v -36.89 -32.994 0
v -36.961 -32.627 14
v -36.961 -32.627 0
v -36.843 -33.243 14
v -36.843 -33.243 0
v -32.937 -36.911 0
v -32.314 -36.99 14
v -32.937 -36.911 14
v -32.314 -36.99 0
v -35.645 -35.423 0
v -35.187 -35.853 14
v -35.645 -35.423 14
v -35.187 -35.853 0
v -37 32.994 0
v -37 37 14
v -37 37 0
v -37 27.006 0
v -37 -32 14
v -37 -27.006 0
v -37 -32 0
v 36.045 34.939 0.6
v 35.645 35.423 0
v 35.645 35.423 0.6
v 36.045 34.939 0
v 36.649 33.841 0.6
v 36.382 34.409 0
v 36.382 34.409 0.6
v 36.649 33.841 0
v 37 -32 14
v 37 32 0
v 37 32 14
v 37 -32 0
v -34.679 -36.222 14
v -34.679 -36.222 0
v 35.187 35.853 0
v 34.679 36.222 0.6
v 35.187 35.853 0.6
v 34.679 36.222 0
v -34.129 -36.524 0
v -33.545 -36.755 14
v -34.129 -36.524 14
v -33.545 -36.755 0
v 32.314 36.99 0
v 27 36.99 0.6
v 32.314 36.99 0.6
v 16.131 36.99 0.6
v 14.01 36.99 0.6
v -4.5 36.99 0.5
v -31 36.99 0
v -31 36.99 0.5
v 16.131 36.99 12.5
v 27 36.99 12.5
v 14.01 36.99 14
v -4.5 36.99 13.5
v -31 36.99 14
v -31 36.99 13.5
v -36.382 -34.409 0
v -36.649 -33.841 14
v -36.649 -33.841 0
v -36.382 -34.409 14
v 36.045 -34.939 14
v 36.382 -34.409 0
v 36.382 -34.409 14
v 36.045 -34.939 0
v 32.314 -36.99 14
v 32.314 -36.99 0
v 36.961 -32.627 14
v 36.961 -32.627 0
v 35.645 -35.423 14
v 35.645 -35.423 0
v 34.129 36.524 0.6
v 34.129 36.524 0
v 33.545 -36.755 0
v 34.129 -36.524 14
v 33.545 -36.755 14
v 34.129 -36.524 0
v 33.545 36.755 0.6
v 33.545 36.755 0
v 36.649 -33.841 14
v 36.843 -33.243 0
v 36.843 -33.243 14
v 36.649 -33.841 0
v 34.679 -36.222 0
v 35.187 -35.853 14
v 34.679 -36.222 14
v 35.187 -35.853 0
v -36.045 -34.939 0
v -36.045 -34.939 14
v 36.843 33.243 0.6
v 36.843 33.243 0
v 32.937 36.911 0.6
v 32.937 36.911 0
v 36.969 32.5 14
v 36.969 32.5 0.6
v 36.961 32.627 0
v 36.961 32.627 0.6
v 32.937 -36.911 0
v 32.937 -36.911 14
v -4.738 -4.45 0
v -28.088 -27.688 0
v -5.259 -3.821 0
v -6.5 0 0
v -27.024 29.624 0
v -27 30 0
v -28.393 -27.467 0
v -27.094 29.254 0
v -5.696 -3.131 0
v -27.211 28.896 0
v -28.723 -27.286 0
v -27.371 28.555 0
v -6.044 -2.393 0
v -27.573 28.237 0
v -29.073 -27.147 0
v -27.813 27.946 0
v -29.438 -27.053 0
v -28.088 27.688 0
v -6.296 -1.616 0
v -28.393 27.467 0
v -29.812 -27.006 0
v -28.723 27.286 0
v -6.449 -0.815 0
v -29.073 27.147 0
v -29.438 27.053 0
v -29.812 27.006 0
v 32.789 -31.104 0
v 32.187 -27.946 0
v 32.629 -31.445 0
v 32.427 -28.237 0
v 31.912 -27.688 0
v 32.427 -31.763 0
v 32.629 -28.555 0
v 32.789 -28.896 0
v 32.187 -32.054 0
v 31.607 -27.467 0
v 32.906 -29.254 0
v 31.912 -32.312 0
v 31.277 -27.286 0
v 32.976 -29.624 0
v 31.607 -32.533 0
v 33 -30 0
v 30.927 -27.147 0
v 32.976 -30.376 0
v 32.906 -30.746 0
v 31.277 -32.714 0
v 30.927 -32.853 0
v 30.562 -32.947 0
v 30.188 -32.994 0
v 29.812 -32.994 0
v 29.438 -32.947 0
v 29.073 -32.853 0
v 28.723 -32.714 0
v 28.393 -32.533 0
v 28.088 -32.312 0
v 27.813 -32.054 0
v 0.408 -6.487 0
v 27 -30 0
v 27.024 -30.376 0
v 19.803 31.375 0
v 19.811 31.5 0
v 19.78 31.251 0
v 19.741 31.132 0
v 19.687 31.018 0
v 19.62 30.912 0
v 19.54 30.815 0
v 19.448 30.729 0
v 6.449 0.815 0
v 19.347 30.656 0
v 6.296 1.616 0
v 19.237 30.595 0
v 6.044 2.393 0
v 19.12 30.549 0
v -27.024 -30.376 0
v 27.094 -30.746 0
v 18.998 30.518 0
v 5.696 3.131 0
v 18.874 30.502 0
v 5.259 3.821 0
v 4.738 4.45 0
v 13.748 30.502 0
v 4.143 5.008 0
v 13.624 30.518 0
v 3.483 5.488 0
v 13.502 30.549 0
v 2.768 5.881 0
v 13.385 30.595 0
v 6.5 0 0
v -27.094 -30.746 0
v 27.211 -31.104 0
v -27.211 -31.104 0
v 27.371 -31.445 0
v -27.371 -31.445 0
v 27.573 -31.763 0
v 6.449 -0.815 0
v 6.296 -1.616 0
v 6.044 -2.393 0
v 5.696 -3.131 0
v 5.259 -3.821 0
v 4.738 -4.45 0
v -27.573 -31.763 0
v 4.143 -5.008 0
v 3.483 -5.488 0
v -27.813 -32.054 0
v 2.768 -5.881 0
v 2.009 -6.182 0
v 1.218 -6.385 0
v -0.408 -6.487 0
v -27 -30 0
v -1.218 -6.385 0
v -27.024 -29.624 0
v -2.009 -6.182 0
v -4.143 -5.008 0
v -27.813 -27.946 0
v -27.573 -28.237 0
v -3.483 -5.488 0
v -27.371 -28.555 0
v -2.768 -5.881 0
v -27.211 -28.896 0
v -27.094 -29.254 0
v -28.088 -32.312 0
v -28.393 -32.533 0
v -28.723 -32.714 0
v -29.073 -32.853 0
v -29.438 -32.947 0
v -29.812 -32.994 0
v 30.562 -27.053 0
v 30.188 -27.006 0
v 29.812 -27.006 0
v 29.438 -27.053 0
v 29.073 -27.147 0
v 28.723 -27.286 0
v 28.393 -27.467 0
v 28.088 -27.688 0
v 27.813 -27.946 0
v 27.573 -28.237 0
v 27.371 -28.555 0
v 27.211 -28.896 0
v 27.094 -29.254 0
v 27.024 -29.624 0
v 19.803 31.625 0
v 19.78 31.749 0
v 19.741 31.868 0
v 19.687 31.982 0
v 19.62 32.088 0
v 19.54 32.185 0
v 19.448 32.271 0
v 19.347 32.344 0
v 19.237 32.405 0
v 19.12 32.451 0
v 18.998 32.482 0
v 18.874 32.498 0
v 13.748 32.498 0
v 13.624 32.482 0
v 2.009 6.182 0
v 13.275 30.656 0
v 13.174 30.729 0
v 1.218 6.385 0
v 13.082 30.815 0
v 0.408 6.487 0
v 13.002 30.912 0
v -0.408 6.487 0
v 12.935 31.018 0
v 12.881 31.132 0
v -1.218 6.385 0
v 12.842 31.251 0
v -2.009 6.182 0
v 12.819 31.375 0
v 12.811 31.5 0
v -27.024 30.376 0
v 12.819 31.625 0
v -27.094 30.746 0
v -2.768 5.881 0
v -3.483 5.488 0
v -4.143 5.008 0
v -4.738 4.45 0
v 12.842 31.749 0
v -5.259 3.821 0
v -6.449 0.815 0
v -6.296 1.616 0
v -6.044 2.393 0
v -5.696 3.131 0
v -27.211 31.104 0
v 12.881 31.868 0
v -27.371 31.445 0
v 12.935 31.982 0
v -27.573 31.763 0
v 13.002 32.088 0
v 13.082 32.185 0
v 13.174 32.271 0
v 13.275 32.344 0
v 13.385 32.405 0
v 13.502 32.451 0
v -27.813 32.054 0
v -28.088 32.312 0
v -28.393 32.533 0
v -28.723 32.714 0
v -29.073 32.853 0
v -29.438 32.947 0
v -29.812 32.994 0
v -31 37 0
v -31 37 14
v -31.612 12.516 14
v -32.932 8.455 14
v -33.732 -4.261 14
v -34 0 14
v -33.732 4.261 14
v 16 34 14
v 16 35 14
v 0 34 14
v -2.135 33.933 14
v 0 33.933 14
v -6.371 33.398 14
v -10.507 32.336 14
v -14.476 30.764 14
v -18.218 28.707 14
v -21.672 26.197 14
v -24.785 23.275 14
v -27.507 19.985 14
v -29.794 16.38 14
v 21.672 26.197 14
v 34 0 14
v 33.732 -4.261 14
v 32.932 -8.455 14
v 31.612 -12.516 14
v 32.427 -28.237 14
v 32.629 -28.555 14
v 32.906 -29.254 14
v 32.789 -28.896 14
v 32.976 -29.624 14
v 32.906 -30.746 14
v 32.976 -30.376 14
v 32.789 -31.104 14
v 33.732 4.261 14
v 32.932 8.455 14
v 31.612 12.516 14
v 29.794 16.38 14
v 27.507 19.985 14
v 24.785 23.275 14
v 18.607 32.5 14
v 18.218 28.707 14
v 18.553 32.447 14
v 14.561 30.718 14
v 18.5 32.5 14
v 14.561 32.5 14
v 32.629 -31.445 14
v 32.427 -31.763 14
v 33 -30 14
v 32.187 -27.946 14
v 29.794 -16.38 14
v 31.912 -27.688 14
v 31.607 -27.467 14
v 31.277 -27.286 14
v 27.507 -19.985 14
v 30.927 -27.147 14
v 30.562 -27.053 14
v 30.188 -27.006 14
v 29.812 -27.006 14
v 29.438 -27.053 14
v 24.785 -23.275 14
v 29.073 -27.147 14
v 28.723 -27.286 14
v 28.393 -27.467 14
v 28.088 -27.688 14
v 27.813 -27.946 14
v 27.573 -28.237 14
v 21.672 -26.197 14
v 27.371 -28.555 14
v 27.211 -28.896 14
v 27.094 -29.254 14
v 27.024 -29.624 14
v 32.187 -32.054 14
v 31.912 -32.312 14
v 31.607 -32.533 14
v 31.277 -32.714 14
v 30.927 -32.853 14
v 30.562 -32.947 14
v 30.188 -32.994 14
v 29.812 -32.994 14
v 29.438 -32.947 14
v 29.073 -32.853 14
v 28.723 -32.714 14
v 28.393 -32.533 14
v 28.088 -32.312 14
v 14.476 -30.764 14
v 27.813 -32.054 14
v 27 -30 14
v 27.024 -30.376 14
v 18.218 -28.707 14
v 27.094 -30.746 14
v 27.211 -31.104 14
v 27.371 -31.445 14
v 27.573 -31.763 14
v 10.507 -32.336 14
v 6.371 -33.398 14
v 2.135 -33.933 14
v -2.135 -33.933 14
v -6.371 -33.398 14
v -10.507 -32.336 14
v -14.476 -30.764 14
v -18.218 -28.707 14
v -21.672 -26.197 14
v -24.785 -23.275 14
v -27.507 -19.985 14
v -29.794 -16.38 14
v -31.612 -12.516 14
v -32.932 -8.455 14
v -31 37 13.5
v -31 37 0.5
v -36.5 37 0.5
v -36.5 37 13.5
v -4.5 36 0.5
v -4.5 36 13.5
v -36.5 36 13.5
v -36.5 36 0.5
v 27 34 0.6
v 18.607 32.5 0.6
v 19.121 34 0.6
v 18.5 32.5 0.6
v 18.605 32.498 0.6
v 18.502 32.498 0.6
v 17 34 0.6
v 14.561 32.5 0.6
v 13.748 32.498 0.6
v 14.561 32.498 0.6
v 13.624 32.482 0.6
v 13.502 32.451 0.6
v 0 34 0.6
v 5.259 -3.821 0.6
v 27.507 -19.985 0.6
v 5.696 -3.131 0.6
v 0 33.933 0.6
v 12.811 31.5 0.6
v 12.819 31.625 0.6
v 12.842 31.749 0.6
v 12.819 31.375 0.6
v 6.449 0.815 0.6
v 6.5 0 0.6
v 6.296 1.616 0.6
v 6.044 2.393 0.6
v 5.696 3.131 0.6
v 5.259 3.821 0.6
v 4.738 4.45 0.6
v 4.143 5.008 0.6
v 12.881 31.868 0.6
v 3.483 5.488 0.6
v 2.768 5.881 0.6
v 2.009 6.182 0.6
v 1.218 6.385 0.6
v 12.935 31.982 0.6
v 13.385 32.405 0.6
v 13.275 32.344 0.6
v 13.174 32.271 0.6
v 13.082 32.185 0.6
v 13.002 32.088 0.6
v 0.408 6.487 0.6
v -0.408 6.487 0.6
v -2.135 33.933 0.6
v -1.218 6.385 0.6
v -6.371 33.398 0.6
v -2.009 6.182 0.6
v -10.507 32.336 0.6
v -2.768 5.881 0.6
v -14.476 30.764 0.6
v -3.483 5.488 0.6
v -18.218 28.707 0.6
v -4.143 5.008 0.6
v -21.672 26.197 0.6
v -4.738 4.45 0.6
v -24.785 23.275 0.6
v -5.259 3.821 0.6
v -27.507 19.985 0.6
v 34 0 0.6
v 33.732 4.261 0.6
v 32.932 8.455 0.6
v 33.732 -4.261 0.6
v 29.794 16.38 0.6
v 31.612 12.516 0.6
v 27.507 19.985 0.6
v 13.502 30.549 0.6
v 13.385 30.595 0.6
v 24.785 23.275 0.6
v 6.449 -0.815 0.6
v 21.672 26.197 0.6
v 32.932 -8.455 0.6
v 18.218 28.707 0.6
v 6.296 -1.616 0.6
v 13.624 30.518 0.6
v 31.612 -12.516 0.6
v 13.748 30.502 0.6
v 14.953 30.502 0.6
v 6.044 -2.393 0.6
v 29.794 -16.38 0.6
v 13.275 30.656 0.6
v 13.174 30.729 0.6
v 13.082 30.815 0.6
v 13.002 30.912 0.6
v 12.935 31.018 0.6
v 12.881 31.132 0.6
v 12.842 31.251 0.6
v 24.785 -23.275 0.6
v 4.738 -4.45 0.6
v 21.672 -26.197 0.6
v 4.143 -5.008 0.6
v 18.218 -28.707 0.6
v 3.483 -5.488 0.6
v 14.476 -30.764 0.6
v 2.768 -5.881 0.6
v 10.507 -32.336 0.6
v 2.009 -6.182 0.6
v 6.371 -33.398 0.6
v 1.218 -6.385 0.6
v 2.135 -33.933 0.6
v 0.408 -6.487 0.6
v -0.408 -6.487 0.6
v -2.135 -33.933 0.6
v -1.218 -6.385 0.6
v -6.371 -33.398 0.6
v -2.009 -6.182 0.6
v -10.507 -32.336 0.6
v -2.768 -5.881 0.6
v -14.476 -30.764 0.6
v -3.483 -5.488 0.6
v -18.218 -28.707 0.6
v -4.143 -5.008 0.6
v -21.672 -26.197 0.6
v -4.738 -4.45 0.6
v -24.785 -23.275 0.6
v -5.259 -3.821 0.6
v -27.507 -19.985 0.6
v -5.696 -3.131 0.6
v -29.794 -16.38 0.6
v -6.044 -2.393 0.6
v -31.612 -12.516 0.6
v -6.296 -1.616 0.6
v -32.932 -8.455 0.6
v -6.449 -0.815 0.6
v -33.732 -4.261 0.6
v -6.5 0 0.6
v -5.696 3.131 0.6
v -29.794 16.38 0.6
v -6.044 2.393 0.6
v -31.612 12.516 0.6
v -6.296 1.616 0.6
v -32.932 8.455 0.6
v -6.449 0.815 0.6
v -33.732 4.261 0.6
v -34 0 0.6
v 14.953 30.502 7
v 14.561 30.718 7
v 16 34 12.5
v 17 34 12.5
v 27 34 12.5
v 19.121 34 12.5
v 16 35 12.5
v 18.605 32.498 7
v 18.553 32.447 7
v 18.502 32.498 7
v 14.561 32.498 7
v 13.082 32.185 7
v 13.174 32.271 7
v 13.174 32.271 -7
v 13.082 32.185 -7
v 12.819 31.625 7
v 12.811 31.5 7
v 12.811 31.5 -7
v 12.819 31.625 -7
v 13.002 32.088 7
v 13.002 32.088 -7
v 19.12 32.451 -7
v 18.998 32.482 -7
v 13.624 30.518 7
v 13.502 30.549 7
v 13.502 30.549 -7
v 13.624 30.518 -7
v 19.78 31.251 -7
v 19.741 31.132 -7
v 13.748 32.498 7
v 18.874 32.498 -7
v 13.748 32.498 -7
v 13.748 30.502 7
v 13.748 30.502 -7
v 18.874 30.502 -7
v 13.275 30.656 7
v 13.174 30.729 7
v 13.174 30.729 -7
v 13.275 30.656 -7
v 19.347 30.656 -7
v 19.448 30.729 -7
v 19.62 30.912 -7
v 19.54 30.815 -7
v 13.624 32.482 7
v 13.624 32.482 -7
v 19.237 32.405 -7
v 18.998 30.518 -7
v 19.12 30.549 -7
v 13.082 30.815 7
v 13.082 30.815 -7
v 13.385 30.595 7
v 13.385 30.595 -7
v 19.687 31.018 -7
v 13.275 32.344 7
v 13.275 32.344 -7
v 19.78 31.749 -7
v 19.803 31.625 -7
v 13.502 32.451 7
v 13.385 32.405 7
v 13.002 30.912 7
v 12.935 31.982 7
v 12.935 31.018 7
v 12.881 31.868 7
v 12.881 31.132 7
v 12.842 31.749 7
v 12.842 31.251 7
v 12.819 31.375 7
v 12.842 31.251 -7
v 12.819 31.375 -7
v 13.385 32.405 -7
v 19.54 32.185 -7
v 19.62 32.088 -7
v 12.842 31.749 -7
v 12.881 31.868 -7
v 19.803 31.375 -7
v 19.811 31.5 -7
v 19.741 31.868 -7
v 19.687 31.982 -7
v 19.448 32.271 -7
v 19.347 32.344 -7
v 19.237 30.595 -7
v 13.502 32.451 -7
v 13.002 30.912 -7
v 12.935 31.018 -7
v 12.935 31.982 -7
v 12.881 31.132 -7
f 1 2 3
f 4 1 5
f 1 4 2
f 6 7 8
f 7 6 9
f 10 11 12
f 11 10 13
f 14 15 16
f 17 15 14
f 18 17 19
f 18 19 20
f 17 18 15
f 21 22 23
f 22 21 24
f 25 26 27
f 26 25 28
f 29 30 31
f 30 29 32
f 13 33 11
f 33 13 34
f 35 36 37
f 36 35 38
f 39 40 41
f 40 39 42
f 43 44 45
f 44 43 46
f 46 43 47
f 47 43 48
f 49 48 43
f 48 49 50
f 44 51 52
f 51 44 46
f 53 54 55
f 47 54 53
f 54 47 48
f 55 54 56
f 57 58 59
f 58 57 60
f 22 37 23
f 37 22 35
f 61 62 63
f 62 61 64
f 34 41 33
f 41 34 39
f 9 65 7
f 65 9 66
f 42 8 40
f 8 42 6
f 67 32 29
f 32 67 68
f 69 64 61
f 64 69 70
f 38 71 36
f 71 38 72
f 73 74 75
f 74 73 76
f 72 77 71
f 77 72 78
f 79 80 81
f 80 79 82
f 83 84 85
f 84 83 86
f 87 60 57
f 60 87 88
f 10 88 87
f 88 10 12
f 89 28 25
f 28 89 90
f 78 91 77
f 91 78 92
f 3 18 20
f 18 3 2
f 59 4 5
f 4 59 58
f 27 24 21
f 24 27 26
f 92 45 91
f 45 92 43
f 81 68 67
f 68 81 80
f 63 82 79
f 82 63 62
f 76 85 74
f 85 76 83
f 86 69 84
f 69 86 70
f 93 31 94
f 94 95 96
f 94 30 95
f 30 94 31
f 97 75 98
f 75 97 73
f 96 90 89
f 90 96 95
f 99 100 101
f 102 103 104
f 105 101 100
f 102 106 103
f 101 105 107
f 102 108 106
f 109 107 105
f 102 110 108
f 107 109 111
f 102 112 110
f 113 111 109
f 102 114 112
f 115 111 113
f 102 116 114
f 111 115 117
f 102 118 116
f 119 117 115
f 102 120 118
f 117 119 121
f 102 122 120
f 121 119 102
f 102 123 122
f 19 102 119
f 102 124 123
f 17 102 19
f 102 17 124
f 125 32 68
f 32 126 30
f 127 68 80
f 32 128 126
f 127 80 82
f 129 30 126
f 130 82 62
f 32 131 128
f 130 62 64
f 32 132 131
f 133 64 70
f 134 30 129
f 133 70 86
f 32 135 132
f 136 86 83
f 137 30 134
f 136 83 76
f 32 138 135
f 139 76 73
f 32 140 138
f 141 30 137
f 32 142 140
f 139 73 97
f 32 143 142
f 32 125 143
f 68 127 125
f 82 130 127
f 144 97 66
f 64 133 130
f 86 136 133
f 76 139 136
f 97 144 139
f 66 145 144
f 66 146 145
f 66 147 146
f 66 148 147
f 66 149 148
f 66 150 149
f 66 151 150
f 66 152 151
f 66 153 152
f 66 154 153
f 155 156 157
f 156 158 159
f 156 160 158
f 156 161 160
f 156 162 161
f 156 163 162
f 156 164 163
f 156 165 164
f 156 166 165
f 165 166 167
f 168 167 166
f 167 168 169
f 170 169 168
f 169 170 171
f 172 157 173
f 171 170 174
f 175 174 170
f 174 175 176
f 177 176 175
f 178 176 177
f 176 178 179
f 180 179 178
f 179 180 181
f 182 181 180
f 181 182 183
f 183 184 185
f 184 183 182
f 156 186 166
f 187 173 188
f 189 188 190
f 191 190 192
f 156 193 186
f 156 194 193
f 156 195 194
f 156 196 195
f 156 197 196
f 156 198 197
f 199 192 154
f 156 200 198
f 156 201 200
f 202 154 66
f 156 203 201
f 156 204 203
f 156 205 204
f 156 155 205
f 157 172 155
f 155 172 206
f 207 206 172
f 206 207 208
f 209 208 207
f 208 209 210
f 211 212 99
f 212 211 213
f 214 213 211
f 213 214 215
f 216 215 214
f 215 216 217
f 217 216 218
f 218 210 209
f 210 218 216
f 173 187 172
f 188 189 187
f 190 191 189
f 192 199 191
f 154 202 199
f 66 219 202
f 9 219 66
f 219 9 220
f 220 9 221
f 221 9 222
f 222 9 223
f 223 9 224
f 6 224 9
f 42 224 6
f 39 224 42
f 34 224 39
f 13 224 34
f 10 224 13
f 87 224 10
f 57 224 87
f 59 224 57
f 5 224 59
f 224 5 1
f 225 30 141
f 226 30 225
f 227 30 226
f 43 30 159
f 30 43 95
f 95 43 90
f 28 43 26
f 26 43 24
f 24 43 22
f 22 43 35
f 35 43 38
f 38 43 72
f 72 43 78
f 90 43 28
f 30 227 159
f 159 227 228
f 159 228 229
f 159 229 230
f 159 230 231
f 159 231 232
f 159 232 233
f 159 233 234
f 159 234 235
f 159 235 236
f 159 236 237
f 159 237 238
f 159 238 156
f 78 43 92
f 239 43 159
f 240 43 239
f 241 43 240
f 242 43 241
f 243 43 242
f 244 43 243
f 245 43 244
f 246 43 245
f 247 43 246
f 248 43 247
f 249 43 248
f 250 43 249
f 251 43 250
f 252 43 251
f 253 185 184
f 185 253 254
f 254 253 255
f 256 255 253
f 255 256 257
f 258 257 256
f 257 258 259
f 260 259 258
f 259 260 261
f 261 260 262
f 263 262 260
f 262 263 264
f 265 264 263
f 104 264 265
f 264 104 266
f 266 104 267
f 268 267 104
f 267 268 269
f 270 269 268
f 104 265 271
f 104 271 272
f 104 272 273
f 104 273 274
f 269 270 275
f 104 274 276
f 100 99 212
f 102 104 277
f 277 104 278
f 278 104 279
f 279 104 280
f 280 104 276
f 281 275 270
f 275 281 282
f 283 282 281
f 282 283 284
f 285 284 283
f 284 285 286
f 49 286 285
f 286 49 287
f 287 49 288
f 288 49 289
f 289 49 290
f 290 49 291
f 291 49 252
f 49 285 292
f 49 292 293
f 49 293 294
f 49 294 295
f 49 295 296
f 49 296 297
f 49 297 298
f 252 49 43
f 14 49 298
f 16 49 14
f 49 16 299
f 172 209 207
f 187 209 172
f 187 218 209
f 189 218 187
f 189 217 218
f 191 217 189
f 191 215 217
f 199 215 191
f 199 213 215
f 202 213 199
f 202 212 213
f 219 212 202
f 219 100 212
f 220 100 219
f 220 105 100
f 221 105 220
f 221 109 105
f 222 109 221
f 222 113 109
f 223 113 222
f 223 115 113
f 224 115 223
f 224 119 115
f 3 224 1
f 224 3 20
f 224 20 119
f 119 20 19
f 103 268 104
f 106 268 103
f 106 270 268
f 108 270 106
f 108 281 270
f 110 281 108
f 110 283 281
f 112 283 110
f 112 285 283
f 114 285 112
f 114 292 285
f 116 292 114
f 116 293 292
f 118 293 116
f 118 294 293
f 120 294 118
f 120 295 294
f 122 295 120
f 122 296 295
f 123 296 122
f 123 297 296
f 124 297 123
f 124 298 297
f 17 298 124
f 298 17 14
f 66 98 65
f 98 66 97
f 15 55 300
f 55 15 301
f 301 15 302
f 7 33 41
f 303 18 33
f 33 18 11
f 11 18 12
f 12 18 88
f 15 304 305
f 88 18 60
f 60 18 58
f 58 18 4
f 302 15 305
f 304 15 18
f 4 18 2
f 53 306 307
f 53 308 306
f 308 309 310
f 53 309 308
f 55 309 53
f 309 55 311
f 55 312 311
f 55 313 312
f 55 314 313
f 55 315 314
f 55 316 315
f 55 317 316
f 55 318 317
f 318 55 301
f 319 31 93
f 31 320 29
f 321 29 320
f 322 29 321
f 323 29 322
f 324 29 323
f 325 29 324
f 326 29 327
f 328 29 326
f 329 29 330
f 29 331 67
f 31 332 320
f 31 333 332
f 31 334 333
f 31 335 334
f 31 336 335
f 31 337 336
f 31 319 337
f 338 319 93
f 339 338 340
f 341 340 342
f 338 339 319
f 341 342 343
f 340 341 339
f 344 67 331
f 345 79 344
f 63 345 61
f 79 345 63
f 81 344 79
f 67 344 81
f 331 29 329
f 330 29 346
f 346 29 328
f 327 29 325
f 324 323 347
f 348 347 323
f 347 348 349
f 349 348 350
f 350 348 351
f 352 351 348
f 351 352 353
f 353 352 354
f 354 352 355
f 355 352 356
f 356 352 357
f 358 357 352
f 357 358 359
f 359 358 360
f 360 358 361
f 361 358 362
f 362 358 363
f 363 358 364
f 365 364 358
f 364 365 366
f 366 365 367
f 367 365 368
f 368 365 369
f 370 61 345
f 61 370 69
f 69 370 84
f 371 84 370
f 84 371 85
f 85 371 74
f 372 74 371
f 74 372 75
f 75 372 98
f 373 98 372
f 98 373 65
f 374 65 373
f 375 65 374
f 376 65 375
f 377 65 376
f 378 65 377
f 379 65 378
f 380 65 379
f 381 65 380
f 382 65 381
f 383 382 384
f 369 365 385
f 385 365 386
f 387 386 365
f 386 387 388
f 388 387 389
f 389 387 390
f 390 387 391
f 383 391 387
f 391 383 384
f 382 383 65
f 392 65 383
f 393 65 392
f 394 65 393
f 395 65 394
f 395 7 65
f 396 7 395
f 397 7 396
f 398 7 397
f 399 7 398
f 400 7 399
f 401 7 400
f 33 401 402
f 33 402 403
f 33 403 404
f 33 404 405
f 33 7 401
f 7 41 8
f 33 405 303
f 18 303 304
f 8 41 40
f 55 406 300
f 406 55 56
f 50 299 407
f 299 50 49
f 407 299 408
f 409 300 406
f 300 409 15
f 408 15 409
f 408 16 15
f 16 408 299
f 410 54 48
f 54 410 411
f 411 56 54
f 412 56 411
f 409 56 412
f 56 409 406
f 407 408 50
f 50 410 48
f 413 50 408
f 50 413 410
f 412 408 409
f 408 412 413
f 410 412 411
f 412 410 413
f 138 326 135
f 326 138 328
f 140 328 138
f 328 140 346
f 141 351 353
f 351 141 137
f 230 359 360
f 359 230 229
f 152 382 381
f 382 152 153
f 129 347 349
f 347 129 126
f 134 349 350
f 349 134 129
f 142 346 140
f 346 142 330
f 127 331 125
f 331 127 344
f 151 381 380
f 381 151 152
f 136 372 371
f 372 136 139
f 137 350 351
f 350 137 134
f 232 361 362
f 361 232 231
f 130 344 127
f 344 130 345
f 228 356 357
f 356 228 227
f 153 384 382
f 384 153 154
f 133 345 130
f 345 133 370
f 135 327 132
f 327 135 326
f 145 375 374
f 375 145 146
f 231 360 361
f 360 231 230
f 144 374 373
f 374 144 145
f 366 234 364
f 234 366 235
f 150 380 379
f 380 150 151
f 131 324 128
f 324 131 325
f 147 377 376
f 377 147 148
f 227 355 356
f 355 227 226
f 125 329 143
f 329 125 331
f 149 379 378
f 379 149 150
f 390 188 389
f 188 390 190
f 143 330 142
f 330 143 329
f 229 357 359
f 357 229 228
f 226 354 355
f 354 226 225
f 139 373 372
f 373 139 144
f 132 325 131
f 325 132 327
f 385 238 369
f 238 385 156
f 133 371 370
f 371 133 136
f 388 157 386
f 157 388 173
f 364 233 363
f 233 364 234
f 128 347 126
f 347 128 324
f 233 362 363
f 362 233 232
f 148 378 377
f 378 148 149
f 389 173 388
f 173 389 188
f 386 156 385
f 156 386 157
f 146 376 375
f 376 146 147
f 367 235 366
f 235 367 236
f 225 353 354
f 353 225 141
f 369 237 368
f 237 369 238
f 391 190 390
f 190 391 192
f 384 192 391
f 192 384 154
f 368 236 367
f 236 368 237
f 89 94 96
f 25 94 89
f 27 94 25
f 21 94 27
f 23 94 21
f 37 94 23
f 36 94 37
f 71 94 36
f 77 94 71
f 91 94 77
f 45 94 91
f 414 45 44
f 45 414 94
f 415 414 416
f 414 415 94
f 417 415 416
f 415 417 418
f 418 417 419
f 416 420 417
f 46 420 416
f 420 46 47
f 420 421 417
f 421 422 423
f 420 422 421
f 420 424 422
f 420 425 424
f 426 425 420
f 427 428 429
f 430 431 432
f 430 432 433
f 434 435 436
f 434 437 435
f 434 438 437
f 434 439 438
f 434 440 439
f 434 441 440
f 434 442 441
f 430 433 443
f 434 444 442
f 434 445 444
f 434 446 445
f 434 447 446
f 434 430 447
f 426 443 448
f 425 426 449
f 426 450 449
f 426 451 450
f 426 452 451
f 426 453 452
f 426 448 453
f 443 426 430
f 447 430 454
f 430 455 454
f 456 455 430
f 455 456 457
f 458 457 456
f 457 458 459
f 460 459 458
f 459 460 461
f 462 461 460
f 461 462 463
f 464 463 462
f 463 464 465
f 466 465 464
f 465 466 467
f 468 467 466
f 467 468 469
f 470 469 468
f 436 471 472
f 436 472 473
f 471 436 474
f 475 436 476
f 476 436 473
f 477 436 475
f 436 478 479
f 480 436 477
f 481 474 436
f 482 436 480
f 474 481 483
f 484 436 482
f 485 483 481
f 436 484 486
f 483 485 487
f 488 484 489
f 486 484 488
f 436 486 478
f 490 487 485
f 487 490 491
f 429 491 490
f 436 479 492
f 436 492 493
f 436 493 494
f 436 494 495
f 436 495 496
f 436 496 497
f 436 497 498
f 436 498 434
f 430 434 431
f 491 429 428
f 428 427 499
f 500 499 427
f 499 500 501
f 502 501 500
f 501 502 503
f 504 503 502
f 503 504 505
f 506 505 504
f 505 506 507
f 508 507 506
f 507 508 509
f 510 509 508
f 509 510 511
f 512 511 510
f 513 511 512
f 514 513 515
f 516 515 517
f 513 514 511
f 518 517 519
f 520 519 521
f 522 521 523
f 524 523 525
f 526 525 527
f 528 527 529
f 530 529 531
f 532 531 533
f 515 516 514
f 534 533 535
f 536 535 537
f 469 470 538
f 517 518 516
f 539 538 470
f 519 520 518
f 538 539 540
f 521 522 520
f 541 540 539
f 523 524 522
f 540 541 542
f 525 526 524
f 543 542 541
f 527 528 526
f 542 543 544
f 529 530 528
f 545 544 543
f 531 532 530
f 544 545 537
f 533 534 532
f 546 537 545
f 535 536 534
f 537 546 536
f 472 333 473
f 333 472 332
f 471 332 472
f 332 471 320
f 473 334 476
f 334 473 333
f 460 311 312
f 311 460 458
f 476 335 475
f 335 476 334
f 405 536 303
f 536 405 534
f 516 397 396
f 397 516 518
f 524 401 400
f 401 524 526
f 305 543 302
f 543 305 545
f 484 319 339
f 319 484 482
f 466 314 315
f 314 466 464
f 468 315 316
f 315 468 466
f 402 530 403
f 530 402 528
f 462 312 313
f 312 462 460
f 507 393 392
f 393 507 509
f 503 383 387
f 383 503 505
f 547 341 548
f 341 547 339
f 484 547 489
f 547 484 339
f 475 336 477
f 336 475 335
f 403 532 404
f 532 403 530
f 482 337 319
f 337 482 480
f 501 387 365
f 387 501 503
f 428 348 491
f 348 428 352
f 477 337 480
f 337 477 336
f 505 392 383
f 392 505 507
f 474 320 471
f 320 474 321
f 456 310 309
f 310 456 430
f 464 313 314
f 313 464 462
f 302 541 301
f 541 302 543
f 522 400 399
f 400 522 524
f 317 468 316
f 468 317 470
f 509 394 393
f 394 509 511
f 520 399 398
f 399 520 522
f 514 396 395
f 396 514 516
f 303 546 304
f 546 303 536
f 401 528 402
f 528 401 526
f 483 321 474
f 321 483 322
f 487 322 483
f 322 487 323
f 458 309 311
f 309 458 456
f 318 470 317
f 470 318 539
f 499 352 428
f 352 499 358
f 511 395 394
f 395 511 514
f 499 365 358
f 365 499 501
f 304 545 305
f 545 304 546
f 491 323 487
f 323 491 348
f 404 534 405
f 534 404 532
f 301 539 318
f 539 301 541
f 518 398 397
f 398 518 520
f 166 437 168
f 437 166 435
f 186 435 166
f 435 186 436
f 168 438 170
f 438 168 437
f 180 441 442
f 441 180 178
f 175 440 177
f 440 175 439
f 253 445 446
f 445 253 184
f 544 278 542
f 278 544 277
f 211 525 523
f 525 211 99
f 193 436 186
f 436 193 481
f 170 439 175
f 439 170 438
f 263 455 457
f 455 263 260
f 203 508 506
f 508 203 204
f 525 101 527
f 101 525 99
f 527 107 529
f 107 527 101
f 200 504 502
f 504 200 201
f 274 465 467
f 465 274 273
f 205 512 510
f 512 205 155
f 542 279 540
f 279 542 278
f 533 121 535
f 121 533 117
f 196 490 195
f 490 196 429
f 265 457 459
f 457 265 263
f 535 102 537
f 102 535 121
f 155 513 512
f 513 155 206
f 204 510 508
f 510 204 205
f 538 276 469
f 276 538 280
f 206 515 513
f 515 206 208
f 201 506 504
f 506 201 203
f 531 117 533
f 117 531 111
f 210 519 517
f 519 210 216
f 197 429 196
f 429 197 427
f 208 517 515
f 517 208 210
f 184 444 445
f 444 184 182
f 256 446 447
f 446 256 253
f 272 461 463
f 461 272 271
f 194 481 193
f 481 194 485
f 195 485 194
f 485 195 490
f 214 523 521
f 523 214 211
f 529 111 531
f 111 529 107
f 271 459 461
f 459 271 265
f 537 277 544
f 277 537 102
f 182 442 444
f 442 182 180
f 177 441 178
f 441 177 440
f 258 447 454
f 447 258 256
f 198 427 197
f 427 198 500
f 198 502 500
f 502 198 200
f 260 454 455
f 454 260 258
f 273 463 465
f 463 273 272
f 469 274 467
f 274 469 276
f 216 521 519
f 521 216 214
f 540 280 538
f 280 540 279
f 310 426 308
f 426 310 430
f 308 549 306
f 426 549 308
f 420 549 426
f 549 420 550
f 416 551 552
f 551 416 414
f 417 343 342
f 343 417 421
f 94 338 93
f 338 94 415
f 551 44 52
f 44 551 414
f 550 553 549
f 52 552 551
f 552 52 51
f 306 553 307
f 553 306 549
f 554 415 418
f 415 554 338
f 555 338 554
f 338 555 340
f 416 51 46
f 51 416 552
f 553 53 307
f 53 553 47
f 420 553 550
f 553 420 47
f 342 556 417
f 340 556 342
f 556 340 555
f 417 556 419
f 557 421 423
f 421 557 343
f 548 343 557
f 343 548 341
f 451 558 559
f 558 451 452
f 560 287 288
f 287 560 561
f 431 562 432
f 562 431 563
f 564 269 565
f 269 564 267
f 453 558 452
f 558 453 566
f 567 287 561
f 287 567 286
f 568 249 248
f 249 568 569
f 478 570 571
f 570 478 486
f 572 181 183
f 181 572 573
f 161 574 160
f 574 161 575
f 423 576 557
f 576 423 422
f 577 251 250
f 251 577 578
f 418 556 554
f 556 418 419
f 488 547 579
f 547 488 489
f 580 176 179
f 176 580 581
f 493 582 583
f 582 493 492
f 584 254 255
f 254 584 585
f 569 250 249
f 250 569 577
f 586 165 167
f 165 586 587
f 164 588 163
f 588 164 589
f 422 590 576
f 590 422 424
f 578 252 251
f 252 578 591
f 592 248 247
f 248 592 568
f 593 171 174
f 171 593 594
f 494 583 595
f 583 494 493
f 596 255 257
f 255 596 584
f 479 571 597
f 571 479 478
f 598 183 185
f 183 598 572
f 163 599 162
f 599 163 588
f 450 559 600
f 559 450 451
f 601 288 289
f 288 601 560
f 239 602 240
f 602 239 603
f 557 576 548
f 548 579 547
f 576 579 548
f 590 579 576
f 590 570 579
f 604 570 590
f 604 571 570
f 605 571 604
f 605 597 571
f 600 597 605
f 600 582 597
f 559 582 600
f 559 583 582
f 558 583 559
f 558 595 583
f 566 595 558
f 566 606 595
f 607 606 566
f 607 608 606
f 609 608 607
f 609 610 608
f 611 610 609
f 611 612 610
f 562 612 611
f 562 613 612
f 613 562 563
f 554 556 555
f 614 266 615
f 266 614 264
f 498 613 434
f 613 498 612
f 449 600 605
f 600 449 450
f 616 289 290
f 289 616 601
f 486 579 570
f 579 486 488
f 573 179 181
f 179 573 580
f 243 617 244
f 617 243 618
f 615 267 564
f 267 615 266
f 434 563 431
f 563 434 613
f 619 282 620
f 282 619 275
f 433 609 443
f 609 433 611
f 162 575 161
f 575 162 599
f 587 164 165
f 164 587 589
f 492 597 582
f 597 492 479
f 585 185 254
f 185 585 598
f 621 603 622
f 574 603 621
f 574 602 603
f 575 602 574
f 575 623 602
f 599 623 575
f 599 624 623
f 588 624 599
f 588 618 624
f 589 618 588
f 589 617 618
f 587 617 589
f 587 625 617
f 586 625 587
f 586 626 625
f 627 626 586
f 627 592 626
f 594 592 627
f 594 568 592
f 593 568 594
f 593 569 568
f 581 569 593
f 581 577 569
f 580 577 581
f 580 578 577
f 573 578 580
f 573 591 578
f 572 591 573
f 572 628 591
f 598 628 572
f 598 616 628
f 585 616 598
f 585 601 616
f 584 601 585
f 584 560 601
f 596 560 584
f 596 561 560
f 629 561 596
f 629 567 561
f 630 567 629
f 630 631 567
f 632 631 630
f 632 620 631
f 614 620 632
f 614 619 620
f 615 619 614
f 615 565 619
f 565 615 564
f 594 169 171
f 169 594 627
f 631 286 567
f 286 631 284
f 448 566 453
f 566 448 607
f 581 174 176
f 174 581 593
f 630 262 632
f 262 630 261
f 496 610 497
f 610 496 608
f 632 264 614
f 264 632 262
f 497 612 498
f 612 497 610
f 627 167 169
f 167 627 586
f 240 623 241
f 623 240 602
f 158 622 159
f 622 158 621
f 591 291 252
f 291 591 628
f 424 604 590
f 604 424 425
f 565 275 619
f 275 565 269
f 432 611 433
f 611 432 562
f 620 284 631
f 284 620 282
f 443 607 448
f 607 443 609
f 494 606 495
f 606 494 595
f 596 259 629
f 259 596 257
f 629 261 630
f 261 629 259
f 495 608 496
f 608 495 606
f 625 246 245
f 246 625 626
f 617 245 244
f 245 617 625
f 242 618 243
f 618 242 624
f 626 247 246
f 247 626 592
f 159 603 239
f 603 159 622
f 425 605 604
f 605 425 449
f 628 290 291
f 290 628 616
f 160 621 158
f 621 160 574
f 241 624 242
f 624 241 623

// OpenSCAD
$fn = 50;


union() {
	difference() {
		union() {
			hull() {
				translate(v = [-32.0000000000, 32.0000000000, 0]) {
					cylinder(h = 14, r = 5);
				}
				translate(v = [32.0000000000, 32.0000000000, 0]) {
					cylinder(h = 14, r = 5);
				}
				translate(v = [-32.0000000000, -32.0000000000, 0]) {
					cylinder(h = 14, r = 5);
				}
				translate(v = [32.0000000000, -32.0000000000, 0]) {
					cylinder(h = 14, r = 5);
				}
			}
			translate(v = [-37.0000000000, 31.0000000000, 0]) {
				cube(size = [6, 6, 14]);
			}
		}
		union() {
			translate(v = [-37.5000000000, -30.0000000000, -250.0000000000]) {
				rotate(a = [0, 0, 0]) {
					difference() {
						union() {
							hull() {
								translate(v = [7.5000000000, 0, 0]) {
									cylinder(h = 250, r = 3.0000000000, r1 = 3.0000000000, r2 = 3.0000000000);
								}
								translate(v = [-7.5000000000, 0, 0]) {
									cylinder(h = 250, r = 3.0000000000, r1 = 3.0000000000, r2 = 3.0000000000);
								}
							}
						}
						union();
					}
				}
			}
			translate(v = [-37.5000000000, 30.0000000000, -250.0000000000]) {
				rotate(a = [0, 0, 0]) {
					difference() {
						union() {
							hull() {
								translate(v = [7.5000000000, 0, 0]) {
									cylinder(h = 250, r = 3.0000000000, r1 = 3.0000000000, r2 = 3.0000000000);
								}
								translate(v = [-7.5000000000, 0, 0]) {
									cylinder(h = 250, r = 3.0000000000, r1 = 3.0000000000, r2 = 3.0000000000);
								}
							}
						}
						union();
					}
				}
			}
			translate(v = [-36.5000000000, 36.0000000000, 0.5000000000]) {
				cube(size = [32, 1, 13.0000000000]);
			}
			translate(v = [30.0000000000, -30.0000000000, 0]) {
				cylinder(h = 100, r = 3.0000000000);
			}
			translate(v = [0, 0, 0.6000000000]) {
				cylinder(h = 16.4000000000, r = 34.0000000000);
			}
			translate(v = [0, 0, -7.0000000000]) {
				cylinder(h = 14, r = 6.5000000000);
			}
			translate(v = [0.0000000000, 32.5000000000, 0.6000000000]) {
				cube(size = [37.0000000000, 1.5000000000, 16.4000000000]);
			}
			translate(v = [27.0000000000, 32.5000000000, 0.6000000000]) {
				cube(size = [10, 4.5000000000, 16.4000000000]);
			}
			translate(v = [16.0000000000, 32.5000000000, 12.5000000000]) {
				cube(size = [21, 4.5000000000, 1.5000000000]);
			}
			translate(v = [13.2500000000, 37.7500000000, 0.6000000000]) {
				rotate(a = [0, 0, -45]) {
					cube(size = [7.5000000000, 1.5000000000, 16.4000000000]);
				}
			}
			translate(v = [7.0610000000, 30.5000000000, 0.6000000000]) {
				cube(size = [7.5000000000, 2, 13.4000000000]);
			}
		}
	}
	union() {
		translate(v = [16.3110000000, 31.5000000000, -7.0000000000]) {
			rotate(a = [0, 0, 0]) {
				difference() {
					union() {
						#hull() {
							#translate(v = [2.5000000000, 0, 0]) {
								cylinder(h = 14, r = 1.0000000000, r1 = 1.0000000000, r2 = 1.0000000000);
							}
							#translate(v = [-2.5000000000, 0, 0]) {
								cylinder(h = 14, r = 1.0000000000, r1 = 1.0000000000, r2 = 1.0000000000);
							}
						}
					}
					union();
				}
			}
		}
	}
}
